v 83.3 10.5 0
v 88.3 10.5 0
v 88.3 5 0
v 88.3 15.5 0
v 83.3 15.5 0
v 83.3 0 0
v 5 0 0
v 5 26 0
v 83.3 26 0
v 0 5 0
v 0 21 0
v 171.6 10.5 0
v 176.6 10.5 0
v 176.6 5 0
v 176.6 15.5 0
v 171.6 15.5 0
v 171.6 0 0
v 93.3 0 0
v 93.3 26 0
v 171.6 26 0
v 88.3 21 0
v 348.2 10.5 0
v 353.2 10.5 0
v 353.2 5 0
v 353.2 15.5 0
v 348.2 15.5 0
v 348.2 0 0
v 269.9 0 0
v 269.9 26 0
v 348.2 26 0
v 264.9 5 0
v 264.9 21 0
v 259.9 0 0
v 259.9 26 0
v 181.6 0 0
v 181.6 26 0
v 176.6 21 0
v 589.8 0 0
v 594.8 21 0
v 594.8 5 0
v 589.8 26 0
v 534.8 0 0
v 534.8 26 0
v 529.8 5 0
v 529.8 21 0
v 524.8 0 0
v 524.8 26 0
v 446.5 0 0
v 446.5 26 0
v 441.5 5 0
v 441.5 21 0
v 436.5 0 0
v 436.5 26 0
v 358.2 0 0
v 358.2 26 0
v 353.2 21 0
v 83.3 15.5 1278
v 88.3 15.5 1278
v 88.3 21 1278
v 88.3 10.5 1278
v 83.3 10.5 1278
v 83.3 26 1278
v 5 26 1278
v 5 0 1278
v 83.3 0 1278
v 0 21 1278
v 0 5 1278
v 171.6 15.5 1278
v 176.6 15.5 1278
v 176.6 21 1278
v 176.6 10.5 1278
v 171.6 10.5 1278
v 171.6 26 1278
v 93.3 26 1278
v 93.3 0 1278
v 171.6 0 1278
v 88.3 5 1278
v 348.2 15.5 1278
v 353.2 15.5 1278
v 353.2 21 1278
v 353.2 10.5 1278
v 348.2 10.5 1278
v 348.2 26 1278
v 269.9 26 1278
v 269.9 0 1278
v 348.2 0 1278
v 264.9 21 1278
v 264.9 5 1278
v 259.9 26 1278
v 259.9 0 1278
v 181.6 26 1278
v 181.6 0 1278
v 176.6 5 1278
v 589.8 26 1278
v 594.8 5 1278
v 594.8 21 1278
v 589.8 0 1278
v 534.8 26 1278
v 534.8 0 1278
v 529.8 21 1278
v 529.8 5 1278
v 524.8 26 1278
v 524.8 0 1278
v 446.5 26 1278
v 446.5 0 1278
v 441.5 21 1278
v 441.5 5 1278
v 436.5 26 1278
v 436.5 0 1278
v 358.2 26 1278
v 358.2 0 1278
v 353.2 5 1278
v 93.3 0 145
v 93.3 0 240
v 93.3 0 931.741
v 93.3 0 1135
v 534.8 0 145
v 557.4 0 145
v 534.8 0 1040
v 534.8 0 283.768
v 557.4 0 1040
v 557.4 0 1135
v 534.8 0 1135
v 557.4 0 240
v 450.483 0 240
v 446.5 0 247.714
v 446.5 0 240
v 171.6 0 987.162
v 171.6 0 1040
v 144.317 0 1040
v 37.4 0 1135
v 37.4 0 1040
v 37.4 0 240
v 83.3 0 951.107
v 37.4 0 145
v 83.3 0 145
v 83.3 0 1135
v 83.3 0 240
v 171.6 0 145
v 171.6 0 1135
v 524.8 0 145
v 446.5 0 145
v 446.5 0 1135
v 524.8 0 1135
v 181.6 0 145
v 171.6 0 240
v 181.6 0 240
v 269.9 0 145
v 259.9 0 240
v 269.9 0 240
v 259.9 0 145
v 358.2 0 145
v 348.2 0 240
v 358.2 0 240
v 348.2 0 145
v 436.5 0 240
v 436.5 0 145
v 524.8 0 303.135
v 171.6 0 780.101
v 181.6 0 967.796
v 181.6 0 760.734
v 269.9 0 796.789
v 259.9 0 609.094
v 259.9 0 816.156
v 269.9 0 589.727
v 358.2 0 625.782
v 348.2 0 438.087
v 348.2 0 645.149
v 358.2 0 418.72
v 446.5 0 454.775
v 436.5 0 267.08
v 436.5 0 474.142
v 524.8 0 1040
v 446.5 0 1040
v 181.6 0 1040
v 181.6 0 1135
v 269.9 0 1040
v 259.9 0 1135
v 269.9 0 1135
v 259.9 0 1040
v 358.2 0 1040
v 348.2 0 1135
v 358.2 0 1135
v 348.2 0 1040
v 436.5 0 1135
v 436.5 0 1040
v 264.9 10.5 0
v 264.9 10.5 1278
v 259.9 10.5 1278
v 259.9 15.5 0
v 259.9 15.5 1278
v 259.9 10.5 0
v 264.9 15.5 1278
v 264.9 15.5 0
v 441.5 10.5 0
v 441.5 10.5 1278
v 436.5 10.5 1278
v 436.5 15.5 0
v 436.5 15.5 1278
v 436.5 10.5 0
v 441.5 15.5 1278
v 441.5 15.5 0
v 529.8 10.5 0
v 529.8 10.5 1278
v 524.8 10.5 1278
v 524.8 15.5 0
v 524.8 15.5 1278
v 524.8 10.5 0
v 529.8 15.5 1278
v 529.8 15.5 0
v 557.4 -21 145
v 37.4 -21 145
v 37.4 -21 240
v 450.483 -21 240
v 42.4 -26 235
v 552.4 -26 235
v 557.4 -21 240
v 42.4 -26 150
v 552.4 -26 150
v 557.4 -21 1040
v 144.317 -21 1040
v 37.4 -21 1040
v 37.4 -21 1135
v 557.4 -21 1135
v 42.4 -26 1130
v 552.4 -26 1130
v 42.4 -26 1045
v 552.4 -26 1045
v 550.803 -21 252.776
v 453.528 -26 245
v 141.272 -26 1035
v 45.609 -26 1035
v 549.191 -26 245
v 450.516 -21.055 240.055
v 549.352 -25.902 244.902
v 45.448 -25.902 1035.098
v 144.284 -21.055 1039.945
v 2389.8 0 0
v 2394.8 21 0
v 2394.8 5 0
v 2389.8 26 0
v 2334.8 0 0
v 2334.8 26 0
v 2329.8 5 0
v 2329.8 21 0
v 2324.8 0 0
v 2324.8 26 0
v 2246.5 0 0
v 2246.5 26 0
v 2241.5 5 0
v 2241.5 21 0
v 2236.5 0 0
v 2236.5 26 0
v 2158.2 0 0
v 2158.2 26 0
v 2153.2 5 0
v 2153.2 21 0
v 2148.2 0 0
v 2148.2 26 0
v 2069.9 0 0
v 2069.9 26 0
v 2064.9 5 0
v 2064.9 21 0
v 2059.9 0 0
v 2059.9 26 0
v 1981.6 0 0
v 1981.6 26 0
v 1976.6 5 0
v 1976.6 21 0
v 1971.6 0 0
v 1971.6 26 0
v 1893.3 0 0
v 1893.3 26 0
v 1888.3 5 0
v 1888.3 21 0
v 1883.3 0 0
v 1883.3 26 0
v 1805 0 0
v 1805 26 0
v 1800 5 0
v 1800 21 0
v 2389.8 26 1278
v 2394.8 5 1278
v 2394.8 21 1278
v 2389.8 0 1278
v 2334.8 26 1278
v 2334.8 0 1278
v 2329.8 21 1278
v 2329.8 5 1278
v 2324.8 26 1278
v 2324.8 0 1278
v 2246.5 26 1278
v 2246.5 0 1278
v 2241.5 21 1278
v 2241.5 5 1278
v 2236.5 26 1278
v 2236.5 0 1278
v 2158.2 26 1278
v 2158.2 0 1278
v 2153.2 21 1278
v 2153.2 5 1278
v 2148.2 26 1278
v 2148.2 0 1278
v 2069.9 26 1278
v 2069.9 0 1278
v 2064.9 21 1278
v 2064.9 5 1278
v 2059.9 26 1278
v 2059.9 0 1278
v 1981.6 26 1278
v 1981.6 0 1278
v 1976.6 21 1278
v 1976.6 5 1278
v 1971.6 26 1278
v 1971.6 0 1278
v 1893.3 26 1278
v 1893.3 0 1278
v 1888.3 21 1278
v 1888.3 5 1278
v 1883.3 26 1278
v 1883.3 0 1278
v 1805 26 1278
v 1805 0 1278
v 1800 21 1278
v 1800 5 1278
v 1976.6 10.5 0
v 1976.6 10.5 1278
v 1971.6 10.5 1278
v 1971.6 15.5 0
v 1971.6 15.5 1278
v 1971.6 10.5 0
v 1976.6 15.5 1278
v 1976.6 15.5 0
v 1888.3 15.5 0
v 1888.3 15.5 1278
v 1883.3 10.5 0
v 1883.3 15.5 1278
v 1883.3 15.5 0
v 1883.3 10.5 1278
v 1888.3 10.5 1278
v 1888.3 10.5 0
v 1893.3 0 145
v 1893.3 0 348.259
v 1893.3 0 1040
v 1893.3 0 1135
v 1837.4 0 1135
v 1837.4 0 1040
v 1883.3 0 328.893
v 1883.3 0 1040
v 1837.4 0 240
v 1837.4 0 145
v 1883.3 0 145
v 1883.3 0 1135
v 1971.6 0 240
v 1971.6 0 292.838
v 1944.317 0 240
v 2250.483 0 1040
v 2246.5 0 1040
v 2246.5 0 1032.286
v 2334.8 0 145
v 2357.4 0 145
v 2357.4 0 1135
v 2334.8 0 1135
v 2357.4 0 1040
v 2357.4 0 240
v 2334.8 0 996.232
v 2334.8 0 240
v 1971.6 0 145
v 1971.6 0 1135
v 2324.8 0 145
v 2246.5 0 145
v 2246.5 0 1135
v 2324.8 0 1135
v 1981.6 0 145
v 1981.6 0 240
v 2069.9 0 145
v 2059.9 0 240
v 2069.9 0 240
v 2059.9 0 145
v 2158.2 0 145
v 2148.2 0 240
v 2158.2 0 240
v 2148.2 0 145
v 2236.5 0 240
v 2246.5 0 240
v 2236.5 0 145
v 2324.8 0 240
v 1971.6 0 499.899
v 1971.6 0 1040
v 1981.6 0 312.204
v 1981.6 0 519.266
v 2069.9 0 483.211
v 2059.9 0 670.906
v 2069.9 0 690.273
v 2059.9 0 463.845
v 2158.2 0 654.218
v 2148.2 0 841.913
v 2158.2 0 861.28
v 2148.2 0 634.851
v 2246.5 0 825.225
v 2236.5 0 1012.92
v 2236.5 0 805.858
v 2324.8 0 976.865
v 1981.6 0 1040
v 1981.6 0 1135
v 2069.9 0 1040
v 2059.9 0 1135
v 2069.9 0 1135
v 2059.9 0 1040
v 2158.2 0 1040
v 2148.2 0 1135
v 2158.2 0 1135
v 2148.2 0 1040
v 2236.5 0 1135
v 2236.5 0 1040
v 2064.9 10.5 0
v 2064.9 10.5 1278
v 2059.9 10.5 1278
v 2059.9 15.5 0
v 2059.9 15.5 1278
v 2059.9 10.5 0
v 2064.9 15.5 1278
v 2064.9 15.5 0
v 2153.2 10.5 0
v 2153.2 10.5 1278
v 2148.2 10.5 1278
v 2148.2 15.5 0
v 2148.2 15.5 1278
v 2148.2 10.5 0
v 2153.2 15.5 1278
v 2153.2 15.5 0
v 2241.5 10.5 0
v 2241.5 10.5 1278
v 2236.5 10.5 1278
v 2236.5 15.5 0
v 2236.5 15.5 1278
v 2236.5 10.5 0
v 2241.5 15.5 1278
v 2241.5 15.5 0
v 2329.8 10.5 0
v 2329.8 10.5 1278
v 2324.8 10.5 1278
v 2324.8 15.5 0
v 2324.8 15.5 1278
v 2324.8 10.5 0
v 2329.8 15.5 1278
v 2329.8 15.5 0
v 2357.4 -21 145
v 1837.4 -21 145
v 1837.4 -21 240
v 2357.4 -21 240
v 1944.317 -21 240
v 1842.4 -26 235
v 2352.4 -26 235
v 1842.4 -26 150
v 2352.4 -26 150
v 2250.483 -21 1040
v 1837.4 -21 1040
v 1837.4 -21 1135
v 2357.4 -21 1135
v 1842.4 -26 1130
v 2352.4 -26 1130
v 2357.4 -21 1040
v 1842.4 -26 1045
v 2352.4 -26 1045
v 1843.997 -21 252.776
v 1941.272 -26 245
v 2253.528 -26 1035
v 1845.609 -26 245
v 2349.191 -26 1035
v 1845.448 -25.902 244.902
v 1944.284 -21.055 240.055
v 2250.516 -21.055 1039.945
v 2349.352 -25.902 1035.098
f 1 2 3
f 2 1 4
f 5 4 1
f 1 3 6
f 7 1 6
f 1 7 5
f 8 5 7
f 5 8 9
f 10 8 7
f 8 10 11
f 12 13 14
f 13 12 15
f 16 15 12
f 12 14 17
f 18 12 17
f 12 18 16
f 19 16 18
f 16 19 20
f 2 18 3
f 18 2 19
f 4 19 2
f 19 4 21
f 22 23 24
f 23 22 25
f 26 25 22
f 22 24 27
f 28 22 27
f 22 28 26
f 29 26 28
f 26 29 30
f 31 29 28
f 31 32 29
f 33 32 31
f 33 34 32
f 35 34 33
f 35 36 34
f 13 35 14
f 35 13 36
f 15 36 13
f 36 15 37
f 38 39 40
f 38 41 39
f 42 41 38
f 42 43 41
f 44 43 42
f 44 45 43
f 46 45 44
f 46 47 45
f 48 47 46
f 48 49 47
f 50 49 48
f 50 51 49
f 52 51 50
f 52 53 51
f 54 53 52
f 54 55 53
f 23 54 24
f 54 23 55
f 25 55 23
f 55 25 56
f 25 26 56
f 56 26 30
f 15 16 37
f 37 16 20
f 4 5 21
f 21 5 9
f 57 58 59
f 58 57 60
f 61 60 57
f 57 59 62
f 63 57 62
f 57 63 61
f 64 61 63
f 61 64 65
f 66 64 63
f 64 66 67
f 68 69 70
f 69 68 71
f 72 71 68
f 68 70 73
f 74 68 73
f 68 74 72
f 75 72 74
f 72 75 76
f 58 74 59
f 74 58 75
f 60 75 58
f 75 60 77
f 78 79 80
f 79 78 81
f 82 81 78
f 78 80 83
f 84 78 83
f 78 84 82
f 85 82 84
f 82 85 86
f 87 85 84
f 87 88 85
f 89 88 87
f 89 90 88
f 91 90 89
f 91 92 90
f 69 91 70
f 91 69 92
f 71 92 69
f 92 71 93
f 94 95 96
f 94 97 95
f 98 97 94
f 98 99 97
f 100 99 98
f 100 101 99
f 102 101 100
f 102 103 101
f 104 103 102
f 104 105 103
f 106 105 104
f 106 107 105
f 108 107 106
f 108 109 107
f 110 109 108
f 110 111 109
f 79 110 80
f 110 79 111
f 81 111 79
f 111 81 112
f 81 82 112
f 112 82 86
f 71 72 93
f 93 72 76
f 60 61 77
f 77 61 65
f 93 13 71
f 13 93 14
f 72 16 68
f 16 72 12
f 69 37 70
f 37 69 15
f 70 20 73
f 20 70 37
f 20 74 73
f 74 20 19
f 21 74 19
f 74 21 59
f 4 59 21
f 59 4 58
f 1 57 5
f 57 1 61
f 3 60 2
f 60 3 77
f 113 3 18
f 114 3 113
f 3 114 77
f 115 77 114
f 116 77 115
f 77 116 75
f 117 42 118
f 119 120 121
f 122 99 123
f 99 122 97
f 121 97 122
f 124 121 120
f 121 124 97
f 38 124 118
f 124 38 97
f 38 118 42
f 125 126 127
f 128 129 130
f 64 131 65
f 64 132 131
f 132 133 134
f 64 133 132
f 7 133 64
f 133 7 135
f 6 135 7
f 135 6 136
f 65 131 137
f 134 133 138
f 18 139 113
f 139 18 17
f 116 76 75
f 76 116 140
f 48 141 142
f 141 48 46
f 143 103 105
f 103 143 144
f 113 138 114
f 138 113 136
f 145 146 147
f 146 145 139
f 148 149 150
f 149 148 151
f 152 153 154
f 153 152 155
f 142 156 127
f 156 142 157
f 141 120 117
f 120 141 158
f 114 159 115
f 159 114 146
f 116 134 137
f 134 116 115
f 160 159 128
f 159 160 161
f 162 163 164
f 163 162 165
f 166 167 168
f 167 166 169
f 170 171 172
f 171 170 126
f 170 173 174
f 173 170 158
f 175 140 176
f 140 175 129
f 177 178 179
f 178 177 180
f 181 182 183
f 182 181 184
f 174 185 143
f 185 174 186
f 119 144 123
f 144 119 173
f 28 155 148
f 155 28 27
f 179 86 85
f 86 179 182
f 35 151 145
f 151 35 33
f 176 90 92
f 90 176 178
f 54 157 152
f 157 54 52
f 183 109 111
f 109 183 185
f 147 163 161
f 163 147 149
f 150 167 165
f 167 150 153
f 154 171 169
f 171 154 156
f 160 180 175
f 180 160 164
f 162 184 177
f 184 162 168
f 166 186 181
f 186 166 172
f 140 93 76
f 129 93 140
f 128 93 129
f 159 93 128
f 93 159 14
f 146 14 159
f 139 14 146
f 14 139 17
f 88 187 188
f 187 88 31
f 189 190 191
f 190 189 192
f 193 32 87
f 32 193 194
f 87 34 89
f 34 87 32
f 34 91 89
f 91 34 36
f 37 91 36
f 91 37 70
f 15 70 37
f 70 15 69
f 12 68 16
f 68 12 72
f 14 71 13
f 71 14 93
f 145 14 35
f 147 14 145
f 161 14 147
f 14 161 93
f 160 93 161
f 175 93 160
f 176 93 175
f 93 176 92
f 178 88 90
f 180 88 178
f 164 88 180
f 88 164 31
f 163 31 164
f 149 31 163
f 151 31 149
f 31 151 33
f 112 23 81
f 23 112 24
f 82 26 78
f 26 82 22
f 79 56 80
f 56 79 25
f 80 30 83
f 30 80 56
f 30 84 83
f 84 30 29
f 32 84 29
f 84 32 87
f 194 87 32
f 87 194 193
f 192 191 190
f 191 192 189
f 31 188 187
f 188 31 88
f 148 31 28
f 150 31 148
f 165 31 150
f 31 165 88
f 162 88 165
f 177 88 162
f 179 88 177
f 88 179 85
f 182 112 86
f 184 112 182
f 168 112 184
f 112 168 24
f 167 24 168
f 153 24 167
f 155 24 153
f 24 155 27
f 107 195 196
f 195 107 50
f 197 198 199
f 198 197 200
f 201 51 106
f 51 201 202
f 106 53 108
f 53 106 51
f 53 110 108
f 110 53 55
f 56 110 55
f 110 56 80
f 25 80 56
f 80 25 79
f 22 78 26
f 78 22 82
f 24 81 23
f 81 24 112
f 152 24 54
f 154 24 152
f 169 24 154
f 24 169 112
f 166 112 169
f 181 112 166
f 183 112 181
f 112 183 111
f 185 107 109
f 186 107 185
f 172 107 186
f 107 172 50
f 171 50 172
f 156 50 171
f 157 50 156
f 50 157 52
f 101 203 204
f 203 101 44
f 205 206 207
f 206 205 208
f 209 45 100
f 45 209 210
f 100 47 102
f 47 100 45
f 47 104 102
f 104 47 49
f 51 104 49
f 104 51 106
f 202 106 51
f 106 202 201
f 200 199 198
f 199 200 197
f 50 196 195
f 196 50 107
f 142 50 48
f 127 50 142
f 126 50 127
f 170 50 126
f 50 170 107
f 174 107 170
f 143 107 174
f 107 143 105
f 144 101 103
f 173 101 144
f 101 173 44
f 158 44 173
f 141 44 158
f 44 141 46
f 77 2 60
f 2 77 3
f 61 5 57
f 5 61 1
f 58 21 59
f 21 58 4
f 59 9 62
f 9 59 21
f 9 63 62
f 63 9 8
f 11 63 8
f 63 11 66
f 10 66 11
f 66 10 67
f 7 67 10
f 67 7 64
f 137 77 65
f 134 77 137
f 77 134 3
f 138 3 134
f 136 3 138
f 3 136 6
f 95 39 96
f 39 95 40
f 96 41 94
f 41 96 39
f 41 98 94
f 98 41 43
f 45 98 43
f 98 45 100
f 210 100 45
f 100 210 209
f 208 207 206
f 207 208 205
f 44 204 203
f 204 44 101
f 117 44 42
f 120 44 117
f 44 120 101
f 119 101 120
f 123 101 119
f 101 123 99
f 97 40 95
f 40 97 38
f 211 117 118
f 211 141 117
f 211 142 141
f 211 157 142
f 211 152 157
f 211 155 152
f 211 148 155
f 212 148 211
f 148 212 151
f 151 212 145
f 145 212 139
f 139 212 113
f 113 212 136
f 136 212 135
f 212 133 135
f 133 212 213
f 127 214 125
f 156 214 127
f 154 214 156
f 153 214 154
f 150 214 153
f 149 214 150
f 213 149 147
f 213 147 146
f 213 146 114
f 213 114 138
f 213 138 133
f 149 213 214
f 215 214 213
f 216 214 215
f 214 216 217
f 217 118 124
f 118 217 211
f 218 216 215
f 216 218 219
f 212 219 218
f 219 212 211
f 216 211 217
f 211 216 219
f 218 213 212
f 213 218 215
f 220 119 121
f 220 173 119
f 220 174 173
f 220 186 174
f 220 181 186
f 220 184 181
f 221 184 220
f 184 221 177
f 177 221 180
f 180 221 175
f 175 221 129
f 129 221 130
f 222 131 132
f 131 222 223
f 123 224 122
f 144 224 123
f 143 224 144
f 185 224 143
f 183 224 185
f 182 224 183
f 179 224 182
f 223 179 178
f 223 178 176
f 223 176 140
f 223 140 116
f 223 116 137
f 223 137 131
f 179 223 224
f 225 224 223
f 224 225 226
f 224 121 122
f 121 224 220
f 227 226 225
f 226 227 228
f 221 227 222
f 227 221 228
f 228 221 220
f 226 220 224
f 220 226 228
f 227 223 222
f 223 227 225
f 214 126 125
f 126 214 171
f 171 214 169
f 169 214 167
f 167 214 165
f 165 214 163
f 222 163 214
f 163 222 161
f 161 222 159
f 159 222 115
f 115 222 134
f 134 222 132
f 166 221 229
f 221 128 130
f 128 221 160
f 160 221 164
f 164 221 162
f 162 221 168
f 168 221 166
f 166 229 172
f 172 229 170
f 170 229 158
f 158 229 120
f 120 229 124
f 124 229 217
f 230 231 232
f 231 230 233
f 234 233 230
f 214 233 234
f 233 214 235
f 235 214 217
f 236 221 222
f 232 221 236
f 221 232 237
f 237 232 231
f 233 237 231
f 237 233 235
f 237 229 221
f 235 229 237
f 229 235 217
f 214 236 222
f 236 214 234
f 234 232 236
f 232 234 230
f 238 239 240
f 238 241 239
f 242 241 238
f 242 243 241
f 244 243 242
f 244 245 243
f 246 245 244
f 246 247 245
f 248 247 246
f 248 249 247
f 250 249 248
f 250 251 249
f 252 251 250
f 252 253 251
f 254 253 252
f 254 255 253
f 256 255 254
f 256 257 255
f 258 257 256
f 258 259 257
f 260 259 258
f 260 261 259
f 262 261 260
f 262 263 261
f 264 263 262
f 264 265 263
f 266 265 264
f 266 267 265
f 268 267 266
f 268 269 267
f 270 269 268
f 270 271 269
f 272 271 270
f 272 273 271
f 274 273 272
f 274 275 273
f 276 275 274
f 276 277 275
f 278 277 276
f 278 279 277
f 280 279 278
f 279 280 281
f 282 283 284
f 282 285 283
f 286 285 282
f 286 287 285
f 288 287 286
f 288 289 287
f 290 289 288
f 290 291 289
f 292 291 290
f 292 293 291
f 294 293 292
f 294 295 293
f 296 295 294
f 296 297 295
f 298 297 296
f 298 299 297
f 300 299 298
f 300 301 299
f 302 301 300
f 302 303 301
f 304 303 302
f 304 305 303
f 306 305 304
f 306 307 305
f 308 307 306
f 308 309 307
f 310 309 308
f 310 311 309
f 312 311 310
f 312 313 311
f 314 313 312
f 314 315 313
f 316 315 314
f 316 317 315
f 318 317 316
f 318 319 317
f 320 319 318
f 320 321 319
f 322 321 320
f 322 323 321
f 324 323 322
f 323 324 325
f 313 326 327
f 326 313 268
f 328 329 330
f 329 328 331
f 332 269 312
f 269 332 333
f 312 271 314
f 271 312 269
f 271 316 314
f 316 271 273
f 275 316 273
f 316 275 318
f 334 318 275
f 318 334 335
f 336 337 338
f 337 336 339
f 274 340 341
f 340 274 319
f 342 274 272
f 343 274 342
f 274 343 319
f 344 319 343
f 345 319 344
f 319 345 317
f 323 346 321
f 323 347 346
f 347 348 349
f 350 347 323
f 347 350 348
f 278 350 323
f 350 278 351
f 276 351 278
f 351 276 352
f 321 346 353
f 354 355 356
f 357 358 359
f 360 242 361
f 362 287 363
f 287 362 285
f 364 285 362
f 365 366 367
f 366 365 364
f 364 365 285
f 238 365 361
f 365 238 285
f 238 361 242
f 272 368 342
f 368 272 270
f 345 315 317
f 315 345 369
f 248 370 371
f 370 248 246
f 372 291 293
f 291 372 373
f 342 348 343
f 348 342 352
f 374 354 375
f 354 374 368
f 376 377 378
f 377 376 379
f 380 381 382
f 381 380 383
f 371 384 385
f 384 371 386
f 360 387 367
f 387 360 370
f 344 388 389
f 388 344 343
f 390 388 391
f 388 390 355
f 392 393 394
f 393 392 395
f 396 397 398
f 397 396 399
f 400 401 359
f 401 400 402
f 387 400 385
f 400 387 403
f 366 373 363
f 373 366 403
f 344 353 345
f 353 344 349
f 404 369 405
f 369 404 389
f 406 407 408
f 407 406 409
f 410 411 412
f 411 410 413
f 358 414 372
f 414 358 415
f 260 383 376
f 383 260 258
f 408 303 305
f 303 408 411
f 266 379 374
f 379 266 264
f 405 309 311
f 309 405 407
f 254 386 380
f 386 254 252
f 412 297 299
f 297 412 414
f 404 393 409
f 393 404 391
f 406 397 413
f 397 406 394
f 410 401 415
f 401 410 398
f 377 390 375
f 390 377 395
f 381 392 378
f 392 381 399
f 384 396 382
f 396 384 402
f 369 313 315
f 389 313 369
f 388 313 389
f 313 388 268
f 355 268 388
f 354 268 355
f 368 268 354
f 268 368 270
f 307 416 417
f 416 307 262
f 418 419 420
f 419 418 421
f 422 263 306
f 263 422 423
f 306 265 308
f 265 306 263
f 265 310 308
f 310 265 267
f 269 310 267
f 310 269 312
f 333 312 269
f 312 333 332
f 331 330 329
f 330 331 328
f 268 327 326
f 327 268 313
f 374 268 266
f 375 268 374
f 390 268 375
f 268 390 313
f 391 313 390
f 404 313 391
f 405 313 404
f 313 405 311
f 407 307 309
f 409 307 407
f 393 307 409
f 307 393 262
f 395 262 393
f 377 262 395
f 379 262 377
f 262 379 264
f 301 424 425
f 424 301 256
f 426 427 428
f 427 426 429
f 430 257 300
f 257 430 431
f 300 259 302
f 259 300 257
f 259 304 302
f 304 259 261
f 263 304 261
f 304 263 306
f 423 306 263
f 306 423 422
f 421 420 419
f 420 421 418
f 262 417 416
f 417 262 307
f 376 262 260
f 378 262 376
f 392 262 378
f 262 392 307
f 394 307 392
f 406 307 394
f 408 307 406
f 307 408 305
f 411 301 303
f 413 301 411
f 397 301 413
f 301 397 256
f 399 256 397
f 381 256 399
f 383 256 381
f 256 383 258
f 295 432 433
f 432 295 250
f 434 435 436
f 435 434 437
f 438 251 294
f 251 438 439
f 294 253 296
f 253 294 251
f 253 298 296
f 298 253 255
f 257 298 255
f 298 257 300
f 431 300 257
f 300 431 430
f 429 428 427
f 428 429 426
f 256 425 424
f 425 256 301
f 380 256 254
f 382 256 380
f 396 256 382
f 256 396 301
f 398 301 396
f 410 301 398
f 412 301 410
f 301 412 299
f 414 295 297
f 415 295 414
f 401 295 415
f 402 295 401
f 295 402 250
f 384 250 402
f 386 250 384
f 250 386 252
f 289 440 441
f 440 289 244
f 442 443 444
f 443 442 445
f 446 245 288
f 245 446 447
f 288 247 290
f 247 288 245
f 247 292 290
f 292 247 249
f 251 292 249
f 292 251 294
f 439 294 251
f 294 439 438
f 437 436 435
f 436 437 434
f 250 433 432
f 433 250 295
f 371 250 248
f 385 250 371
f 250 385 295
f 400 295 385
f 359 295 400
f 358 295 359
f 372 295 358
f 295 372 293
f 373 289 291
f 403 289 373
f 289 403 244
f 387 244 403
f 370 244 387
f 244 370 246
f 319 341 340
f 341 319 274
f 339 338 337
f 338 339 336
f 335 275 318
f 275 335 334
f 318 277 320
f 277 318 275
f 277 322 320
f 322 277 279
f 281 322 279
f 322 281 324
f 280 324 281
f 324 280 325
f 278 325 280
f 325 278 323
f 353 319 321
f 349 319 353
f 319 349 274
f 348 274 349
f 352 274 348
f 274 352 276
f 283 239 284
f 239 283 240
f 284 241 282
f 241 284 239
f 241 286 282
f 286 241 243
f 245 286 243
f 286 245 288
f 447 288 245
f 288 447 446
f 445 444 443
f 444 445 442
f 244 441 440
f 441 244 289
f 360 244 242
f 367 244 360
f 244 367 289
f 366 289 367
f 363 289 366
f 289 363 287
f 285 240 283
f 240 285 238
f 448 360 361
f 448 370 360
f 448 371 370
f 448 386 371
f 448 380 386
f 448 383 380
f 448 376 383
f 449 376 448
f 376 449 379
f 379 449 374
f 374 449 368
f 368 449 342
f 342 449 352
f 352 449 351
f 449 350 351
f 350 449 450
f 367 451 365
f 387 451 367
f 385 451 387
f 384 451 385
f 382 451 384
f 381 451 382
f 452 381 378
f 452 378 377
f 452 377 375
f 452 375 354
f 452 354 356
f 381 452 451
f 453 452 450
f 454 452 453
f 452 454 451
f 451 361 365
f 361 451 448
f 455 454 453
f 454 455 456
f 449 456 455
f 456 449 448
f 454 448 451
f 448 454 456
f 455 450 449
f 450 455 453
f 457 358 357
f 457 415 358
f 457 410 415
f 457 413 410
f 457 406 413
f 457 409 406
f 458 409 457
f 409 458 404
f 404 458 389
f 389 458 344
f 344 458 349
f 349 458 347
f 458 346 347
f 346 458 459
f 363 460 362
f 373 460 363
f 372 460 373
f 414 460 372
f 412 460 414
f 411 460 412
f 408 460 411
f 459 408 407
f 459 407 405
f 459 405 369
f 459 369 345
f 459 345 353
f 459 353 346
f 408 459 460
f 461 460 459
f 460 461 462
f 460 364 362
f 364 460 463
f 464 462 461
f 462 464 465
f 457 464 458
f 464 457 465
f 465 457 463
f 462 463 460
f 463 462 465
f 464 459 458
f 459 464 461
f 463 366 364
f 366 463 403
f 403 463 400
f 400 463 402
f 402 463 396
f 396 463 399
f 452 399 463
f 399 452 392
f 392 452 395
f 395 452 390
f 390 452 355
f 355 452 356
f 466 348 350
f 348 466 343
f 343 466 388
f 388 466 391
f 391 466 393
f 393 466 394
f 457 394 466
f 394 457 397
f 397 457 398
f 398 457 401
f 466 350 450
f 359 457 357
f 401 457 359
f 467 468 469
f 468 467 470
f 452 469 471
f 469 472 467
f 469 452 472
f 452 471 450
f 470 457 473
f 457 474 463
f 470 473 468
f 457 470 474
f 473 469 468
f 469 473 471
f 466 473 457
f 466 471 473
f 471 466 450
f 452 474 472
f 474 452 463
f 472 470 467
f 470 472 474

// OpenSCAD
module shutter_blade(width, length, thickness, groove_depth, chamfer) {
    w = width;
    t = thickness;
    g = groove_depth;
    c = chamfer;

    t2 = t/2;
    g2 = g/2;

    linear_extrude(length) {
        polygon(points=[[c, 0], [w-2*c, 0], [w-c, 0], [w, c], [w, t2-g2],
                        [w-g, t2-g2], [w-g, t2+g2], [w, t2+g2], [w, t-c],
                        [w-c, t], [c, t], [0, t-c], [0, t2+g2], [-g, t2+g2],
                        [-g, t2-g2], [0, t2-g2], [0, c]]);
    }
}

module first_shutter_blade(width, length, thickness, groove_depth, chamfer) {
    w = width;
    t = thickness;
    g = groove_depth;
    c = chamfer;

    t2 = t/2;
    g2 = g/2;

    linear_extrude(length) {
        polygon(points=[[c, 0], [w-2*c, 0], [w-c, 0], [w, c], [w, t2-g2],
                        [w-g, t2-g2], [w-g, t2+g2], [w, t2+g2], [w, t-c],
                        [w-c, t], [c, t], [0, t-c], [0, c]]);
    }
}

module last_shutter_blade(width, length, thickness, groove_depth, chamfer) {
    w = width;
    t = thickness;
    g = groove_depth;
    c = chamfer;

    t2 = t/2;
    g2 = g/2;

    linear_extrude(length) {
        polygon(points=[[c, 0], [w-2*c, 0], [w-c, 0], [w, c], [w, t-c],
                        [w-c, t], [c, t], [0, t-c], [0, t2+g2], [-g, t2+g2],
                        [-g, t2-g2], [0, t2-g2], [0, c]]);
    }
}


module hbar(width, length, thickness, chamfer) {
    w = width;
    t = thickness;
    c = chamfer;
    c2 = chamfer*sqrt(2);

    translate([length, 0, width]) {
        rotate([180, 90, 0]) {
            difference() {
                linear_extrude(length) {
                    polygon(points=[[0, 0], [w, 0], [w, t-c], [w-c, t], [c, t], [0, t-c]]);
                }
                translate([width/2, thickness, 0]) rotate([45, 0, 0]) cube([width, c2, c2], center=true);
                translate([width/2, thickness, length]) rotate([45, 0, 0]) cube([width, c2, c2], center=true);
            }
        }
    }
}

module zbar(hbar_internal_dist, hbar_length, width, thickness, chamfer, sym=true) {
    H = hbar_internal_dist;
    V = hbar_length;
    L = width;
    c2 = chamfer * sqrt(2);
    length = -(H*H*sqrt(V*V-L*L+H*H)-H*L*V)/(L*L-H*H);
    beta = acos(H/length);
    x = L * length / H;
    echo(str("zbar length: ", length));
    echo(str("zbar cut angle: ", beta, "°"));
    rotate([90, 0, 0]) {
        difference() {
            linear_extrude(thickness) {
                polygon(points=[[0, 0], [x, 0], [V, H], [V-x, H]]);
            }
            translate([x/2, 0, thickness]) rotate([45, 0, 0]) cube([x+20, c2, c2], center=true);
            translate([V-x/2, H, thickness]) rotate([45, 0, 0]) cube([x+20, c2, c2], center=true);
            translate([V/2-x/2, H/2, thickness]) rotate([45, 0, 90-beta]) cube([length+20, c2, c2], center=true);
            translate([V/2+x/2, H/2, thickness]) rotate([45, 0, 90-beta]) cube([length+20, c2, c2], center=true);
        }
    }
}

module shutter(first_width, blade_width, last_width, num_blades, length, thickness) {

    first_shutter_blade(first_width, length, thickness, 5, 5);

    for (i = [0: num_blades-3]) {
        translate([blade_width*i+first_width, 0, 0])
            shutter_blade(blade_width, length, thickness, 5, 5);
    }

    translate([(num_blades-2)*blade_width+first_width, 0, 0])
        last_shutter_blade(last_width, length, thickness, 5, 5);



}


bar_pos = ((88.3+88.3*5+65)-520)/2;
color("White") {
    shutter(88.3, 88.3, 65, 7, 1278, 26);
    translate([bar_pos, 0, 145]) hbar(95, 520, 26, 5);
    translate([bar_pos, 0, 800+95+145]) hbar(95, 520, 26, 5);
    translate([bar_pos+520, 0, 145+95]) mirror([1, 0, 0]) zbar(800, 520, 95, 26, 5);
}
color("White") {
    translate([1800, 0, 0]) {
        shutter(88.3, 88.3, 65, 7, 1278, 26);
        translate([bar_pos, 0, 145]) hbar(95, 520, 26, 5);
        translate([bar_pos, 0, 800+95+145]) hbar(95, 520, 26, 5);
        translate([bar_pos, 0, 145+95]) zbar(800, 520, 95, 26, 5);
    }
}

// bar_pos = ((495)-430)/2;
// color("White") {
//     shutter(70.9, 88.3, 70.9, 6, 1680, 26);
//     translate([bar_pos, 0, 1680-180.8-1295-95/2]) hbar(95, 430, 26, 5);
//     translate([bar_pos, 0, 1680-180.8-95/2]) hbar(95, 430, 26, 5);
//     translate([bar_pos+430, 0, 1680-180.8-1295+95/2]) mirror([1, 0, 0]) zbar(1295-95, 430, 95, 26, 5);
// }
// color("White") {
//     translate([1495, 0, 0]) {    shutter(70.9, 88.3, 70.9, 6, 1680, 26);
//         translate([bar_pos, 0, 1680-180.8-1295-95/2]) hbar(95, 430, 26, 5);
//         translate([bar_pos, 0, 1680-180.8-95/2]) hbar(95, 430, 26, 5);
//         translate([bar_pos, 0, 1680-180.8-1295+95/2]) zbar(1295-95, 430, 95, 26, 5);
//     }
// }
